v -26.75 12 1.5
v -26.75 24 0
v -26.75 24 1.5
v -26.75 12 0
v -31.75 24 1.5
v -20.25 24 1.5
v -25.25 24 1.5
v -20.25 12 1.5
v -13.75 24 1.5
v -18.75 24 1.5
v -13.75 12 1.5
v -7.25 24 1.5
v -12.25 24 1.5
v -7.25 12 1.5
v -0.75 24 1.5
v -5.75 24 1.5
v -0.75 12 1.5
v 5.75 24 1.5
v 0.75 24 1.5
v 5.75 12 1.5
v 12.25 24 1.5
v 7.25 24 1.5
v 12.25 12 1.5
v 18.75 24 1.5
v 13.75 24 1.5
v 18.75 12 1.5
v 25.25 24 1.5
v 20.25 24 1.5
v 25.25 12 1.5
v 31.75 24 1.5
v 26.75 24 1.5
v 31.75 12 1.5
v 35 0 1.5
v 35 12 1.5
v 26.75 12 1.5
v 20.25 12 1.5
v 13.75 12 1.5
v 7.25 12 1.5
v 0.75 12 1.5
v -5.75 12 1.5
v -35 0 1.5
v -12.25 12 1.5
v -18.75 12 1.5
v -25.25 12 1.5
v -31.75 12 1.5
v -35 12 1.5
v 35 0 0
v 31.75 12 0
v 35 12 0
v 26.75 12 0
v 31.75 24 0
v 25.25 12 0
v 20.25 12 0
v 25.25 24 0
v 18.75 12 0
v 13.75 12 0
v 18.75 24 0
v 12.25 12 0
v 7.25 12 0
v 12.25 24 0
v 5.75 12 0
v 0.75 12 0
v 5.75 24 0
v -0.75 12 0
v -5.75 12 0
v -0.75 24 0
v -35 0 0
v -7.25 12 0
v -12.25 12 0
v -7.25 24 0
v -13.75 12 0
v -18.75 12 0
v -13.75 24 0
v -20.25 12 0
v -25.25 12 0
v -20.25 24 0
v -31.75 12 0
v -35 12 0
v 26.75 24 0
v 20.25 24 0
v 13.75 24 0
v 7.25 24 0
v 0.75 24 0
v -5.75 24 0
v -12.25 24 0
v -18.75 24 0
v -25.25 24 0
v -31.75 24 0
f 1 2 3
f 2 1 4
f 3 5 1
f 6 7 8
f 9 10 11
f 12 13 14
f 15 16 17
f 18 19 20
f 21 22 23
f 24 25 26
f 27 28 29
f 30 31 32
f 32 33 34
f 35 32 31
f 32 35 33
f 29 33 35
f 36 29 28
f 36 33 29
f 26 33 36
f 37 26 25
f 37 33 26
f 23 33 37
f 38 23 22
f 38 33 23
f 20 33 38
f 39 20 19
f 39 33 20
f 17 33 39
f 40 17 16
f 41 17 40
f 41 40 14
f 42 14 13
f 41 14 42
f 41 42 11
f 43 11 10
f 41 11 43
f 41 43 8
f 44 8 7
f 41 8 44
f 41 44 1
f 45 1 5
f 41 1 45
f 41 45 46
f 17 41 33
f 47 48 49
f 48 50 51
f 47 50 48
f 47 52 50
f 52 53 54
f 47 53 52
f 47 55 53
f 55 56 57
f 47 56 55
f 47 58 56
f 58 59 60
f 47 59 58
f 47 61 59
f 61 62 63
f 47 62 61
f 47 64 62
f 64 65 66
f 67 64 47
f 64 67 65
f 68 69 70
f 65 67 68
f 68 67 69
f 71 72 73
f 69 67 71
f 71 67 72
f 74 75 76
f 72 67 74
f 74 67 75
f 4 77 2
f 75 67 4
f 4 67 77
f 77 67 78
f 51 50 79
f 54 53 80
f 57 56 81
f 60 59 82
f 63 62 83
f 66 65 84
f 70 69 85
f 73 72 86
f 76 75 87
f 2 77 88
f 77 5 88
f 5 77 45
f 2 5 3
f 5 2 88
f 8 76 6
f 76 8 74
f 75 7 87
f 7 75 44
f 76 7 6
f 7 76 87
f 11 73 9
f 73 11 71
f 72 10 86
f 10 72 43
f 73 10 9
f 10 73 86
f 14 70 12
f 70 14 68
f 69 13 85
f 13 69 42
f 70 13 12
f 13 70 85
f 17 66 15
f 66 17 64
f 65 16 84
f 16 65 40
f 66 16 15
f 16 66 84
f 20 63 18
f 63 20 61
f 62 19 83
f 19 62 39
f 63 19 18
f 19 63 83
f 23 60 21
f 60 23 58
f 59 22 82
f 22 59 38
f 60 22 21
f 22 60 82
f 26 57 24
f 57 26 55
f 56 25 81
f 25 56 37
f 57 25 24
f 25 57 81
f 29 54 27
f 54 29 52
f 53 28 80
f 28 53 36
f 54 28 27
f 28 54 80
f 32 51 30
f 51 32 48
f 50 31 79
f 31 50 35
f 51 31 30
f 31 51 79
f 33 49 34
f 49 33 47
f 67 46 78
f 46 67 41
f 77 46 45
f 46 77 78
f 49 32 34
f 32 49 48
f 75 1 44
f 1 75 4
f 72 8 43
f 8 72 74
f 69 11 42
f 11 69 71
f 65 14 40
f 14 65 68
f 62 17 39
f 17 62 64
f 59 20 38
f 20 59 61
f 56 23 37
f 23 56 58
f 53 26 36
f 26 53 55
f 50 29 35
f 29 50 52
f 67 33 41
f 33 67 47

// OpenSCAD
// 10-well agarose gel comb, printed lying flat
// Units: mm. Comb plate thickness (Z) = 1.5 mm.

// ---- Spine (back bar) ----
spine_length = 70;    // X length of spine
spine_width  = 12;    // Y width of spine

// ---- Teeth ----
teeth_count   = 10;   // number of wells/teeth
teeth_width   = 5.0;  // tooth width along X
teeth_length  = 12;   // tooth length along Y (hanging from spine)
teeth_gap     = 1.5;  // gap between neighbouring teeth along X

// ---- Derived ----
plate_thick   = 1.5;  // plate thickness (Z)
row_start_x   = -(teeth_count * teeth_width + (teeth_count - 1) * teeth_gap) / 2;
overcut       = 0.5;  // cutter extension past faces

$fn = 64;

union() {
    // Spine
    translate([-spine_length / 2, 0, 0])
        cube([spine_length, spine_width, plate_thick]);

    // Teeth, centred on the spine in X, hanging in -Y
    for (i = [0 : teeth_count - 1])
        translate([row_start_x + i * (teeth_width + teeth_gap),
                   teeth_length - 0.5,
                   0])
            cube([teeth_width, teeth_length + 0.5, plate_thick]);
}
